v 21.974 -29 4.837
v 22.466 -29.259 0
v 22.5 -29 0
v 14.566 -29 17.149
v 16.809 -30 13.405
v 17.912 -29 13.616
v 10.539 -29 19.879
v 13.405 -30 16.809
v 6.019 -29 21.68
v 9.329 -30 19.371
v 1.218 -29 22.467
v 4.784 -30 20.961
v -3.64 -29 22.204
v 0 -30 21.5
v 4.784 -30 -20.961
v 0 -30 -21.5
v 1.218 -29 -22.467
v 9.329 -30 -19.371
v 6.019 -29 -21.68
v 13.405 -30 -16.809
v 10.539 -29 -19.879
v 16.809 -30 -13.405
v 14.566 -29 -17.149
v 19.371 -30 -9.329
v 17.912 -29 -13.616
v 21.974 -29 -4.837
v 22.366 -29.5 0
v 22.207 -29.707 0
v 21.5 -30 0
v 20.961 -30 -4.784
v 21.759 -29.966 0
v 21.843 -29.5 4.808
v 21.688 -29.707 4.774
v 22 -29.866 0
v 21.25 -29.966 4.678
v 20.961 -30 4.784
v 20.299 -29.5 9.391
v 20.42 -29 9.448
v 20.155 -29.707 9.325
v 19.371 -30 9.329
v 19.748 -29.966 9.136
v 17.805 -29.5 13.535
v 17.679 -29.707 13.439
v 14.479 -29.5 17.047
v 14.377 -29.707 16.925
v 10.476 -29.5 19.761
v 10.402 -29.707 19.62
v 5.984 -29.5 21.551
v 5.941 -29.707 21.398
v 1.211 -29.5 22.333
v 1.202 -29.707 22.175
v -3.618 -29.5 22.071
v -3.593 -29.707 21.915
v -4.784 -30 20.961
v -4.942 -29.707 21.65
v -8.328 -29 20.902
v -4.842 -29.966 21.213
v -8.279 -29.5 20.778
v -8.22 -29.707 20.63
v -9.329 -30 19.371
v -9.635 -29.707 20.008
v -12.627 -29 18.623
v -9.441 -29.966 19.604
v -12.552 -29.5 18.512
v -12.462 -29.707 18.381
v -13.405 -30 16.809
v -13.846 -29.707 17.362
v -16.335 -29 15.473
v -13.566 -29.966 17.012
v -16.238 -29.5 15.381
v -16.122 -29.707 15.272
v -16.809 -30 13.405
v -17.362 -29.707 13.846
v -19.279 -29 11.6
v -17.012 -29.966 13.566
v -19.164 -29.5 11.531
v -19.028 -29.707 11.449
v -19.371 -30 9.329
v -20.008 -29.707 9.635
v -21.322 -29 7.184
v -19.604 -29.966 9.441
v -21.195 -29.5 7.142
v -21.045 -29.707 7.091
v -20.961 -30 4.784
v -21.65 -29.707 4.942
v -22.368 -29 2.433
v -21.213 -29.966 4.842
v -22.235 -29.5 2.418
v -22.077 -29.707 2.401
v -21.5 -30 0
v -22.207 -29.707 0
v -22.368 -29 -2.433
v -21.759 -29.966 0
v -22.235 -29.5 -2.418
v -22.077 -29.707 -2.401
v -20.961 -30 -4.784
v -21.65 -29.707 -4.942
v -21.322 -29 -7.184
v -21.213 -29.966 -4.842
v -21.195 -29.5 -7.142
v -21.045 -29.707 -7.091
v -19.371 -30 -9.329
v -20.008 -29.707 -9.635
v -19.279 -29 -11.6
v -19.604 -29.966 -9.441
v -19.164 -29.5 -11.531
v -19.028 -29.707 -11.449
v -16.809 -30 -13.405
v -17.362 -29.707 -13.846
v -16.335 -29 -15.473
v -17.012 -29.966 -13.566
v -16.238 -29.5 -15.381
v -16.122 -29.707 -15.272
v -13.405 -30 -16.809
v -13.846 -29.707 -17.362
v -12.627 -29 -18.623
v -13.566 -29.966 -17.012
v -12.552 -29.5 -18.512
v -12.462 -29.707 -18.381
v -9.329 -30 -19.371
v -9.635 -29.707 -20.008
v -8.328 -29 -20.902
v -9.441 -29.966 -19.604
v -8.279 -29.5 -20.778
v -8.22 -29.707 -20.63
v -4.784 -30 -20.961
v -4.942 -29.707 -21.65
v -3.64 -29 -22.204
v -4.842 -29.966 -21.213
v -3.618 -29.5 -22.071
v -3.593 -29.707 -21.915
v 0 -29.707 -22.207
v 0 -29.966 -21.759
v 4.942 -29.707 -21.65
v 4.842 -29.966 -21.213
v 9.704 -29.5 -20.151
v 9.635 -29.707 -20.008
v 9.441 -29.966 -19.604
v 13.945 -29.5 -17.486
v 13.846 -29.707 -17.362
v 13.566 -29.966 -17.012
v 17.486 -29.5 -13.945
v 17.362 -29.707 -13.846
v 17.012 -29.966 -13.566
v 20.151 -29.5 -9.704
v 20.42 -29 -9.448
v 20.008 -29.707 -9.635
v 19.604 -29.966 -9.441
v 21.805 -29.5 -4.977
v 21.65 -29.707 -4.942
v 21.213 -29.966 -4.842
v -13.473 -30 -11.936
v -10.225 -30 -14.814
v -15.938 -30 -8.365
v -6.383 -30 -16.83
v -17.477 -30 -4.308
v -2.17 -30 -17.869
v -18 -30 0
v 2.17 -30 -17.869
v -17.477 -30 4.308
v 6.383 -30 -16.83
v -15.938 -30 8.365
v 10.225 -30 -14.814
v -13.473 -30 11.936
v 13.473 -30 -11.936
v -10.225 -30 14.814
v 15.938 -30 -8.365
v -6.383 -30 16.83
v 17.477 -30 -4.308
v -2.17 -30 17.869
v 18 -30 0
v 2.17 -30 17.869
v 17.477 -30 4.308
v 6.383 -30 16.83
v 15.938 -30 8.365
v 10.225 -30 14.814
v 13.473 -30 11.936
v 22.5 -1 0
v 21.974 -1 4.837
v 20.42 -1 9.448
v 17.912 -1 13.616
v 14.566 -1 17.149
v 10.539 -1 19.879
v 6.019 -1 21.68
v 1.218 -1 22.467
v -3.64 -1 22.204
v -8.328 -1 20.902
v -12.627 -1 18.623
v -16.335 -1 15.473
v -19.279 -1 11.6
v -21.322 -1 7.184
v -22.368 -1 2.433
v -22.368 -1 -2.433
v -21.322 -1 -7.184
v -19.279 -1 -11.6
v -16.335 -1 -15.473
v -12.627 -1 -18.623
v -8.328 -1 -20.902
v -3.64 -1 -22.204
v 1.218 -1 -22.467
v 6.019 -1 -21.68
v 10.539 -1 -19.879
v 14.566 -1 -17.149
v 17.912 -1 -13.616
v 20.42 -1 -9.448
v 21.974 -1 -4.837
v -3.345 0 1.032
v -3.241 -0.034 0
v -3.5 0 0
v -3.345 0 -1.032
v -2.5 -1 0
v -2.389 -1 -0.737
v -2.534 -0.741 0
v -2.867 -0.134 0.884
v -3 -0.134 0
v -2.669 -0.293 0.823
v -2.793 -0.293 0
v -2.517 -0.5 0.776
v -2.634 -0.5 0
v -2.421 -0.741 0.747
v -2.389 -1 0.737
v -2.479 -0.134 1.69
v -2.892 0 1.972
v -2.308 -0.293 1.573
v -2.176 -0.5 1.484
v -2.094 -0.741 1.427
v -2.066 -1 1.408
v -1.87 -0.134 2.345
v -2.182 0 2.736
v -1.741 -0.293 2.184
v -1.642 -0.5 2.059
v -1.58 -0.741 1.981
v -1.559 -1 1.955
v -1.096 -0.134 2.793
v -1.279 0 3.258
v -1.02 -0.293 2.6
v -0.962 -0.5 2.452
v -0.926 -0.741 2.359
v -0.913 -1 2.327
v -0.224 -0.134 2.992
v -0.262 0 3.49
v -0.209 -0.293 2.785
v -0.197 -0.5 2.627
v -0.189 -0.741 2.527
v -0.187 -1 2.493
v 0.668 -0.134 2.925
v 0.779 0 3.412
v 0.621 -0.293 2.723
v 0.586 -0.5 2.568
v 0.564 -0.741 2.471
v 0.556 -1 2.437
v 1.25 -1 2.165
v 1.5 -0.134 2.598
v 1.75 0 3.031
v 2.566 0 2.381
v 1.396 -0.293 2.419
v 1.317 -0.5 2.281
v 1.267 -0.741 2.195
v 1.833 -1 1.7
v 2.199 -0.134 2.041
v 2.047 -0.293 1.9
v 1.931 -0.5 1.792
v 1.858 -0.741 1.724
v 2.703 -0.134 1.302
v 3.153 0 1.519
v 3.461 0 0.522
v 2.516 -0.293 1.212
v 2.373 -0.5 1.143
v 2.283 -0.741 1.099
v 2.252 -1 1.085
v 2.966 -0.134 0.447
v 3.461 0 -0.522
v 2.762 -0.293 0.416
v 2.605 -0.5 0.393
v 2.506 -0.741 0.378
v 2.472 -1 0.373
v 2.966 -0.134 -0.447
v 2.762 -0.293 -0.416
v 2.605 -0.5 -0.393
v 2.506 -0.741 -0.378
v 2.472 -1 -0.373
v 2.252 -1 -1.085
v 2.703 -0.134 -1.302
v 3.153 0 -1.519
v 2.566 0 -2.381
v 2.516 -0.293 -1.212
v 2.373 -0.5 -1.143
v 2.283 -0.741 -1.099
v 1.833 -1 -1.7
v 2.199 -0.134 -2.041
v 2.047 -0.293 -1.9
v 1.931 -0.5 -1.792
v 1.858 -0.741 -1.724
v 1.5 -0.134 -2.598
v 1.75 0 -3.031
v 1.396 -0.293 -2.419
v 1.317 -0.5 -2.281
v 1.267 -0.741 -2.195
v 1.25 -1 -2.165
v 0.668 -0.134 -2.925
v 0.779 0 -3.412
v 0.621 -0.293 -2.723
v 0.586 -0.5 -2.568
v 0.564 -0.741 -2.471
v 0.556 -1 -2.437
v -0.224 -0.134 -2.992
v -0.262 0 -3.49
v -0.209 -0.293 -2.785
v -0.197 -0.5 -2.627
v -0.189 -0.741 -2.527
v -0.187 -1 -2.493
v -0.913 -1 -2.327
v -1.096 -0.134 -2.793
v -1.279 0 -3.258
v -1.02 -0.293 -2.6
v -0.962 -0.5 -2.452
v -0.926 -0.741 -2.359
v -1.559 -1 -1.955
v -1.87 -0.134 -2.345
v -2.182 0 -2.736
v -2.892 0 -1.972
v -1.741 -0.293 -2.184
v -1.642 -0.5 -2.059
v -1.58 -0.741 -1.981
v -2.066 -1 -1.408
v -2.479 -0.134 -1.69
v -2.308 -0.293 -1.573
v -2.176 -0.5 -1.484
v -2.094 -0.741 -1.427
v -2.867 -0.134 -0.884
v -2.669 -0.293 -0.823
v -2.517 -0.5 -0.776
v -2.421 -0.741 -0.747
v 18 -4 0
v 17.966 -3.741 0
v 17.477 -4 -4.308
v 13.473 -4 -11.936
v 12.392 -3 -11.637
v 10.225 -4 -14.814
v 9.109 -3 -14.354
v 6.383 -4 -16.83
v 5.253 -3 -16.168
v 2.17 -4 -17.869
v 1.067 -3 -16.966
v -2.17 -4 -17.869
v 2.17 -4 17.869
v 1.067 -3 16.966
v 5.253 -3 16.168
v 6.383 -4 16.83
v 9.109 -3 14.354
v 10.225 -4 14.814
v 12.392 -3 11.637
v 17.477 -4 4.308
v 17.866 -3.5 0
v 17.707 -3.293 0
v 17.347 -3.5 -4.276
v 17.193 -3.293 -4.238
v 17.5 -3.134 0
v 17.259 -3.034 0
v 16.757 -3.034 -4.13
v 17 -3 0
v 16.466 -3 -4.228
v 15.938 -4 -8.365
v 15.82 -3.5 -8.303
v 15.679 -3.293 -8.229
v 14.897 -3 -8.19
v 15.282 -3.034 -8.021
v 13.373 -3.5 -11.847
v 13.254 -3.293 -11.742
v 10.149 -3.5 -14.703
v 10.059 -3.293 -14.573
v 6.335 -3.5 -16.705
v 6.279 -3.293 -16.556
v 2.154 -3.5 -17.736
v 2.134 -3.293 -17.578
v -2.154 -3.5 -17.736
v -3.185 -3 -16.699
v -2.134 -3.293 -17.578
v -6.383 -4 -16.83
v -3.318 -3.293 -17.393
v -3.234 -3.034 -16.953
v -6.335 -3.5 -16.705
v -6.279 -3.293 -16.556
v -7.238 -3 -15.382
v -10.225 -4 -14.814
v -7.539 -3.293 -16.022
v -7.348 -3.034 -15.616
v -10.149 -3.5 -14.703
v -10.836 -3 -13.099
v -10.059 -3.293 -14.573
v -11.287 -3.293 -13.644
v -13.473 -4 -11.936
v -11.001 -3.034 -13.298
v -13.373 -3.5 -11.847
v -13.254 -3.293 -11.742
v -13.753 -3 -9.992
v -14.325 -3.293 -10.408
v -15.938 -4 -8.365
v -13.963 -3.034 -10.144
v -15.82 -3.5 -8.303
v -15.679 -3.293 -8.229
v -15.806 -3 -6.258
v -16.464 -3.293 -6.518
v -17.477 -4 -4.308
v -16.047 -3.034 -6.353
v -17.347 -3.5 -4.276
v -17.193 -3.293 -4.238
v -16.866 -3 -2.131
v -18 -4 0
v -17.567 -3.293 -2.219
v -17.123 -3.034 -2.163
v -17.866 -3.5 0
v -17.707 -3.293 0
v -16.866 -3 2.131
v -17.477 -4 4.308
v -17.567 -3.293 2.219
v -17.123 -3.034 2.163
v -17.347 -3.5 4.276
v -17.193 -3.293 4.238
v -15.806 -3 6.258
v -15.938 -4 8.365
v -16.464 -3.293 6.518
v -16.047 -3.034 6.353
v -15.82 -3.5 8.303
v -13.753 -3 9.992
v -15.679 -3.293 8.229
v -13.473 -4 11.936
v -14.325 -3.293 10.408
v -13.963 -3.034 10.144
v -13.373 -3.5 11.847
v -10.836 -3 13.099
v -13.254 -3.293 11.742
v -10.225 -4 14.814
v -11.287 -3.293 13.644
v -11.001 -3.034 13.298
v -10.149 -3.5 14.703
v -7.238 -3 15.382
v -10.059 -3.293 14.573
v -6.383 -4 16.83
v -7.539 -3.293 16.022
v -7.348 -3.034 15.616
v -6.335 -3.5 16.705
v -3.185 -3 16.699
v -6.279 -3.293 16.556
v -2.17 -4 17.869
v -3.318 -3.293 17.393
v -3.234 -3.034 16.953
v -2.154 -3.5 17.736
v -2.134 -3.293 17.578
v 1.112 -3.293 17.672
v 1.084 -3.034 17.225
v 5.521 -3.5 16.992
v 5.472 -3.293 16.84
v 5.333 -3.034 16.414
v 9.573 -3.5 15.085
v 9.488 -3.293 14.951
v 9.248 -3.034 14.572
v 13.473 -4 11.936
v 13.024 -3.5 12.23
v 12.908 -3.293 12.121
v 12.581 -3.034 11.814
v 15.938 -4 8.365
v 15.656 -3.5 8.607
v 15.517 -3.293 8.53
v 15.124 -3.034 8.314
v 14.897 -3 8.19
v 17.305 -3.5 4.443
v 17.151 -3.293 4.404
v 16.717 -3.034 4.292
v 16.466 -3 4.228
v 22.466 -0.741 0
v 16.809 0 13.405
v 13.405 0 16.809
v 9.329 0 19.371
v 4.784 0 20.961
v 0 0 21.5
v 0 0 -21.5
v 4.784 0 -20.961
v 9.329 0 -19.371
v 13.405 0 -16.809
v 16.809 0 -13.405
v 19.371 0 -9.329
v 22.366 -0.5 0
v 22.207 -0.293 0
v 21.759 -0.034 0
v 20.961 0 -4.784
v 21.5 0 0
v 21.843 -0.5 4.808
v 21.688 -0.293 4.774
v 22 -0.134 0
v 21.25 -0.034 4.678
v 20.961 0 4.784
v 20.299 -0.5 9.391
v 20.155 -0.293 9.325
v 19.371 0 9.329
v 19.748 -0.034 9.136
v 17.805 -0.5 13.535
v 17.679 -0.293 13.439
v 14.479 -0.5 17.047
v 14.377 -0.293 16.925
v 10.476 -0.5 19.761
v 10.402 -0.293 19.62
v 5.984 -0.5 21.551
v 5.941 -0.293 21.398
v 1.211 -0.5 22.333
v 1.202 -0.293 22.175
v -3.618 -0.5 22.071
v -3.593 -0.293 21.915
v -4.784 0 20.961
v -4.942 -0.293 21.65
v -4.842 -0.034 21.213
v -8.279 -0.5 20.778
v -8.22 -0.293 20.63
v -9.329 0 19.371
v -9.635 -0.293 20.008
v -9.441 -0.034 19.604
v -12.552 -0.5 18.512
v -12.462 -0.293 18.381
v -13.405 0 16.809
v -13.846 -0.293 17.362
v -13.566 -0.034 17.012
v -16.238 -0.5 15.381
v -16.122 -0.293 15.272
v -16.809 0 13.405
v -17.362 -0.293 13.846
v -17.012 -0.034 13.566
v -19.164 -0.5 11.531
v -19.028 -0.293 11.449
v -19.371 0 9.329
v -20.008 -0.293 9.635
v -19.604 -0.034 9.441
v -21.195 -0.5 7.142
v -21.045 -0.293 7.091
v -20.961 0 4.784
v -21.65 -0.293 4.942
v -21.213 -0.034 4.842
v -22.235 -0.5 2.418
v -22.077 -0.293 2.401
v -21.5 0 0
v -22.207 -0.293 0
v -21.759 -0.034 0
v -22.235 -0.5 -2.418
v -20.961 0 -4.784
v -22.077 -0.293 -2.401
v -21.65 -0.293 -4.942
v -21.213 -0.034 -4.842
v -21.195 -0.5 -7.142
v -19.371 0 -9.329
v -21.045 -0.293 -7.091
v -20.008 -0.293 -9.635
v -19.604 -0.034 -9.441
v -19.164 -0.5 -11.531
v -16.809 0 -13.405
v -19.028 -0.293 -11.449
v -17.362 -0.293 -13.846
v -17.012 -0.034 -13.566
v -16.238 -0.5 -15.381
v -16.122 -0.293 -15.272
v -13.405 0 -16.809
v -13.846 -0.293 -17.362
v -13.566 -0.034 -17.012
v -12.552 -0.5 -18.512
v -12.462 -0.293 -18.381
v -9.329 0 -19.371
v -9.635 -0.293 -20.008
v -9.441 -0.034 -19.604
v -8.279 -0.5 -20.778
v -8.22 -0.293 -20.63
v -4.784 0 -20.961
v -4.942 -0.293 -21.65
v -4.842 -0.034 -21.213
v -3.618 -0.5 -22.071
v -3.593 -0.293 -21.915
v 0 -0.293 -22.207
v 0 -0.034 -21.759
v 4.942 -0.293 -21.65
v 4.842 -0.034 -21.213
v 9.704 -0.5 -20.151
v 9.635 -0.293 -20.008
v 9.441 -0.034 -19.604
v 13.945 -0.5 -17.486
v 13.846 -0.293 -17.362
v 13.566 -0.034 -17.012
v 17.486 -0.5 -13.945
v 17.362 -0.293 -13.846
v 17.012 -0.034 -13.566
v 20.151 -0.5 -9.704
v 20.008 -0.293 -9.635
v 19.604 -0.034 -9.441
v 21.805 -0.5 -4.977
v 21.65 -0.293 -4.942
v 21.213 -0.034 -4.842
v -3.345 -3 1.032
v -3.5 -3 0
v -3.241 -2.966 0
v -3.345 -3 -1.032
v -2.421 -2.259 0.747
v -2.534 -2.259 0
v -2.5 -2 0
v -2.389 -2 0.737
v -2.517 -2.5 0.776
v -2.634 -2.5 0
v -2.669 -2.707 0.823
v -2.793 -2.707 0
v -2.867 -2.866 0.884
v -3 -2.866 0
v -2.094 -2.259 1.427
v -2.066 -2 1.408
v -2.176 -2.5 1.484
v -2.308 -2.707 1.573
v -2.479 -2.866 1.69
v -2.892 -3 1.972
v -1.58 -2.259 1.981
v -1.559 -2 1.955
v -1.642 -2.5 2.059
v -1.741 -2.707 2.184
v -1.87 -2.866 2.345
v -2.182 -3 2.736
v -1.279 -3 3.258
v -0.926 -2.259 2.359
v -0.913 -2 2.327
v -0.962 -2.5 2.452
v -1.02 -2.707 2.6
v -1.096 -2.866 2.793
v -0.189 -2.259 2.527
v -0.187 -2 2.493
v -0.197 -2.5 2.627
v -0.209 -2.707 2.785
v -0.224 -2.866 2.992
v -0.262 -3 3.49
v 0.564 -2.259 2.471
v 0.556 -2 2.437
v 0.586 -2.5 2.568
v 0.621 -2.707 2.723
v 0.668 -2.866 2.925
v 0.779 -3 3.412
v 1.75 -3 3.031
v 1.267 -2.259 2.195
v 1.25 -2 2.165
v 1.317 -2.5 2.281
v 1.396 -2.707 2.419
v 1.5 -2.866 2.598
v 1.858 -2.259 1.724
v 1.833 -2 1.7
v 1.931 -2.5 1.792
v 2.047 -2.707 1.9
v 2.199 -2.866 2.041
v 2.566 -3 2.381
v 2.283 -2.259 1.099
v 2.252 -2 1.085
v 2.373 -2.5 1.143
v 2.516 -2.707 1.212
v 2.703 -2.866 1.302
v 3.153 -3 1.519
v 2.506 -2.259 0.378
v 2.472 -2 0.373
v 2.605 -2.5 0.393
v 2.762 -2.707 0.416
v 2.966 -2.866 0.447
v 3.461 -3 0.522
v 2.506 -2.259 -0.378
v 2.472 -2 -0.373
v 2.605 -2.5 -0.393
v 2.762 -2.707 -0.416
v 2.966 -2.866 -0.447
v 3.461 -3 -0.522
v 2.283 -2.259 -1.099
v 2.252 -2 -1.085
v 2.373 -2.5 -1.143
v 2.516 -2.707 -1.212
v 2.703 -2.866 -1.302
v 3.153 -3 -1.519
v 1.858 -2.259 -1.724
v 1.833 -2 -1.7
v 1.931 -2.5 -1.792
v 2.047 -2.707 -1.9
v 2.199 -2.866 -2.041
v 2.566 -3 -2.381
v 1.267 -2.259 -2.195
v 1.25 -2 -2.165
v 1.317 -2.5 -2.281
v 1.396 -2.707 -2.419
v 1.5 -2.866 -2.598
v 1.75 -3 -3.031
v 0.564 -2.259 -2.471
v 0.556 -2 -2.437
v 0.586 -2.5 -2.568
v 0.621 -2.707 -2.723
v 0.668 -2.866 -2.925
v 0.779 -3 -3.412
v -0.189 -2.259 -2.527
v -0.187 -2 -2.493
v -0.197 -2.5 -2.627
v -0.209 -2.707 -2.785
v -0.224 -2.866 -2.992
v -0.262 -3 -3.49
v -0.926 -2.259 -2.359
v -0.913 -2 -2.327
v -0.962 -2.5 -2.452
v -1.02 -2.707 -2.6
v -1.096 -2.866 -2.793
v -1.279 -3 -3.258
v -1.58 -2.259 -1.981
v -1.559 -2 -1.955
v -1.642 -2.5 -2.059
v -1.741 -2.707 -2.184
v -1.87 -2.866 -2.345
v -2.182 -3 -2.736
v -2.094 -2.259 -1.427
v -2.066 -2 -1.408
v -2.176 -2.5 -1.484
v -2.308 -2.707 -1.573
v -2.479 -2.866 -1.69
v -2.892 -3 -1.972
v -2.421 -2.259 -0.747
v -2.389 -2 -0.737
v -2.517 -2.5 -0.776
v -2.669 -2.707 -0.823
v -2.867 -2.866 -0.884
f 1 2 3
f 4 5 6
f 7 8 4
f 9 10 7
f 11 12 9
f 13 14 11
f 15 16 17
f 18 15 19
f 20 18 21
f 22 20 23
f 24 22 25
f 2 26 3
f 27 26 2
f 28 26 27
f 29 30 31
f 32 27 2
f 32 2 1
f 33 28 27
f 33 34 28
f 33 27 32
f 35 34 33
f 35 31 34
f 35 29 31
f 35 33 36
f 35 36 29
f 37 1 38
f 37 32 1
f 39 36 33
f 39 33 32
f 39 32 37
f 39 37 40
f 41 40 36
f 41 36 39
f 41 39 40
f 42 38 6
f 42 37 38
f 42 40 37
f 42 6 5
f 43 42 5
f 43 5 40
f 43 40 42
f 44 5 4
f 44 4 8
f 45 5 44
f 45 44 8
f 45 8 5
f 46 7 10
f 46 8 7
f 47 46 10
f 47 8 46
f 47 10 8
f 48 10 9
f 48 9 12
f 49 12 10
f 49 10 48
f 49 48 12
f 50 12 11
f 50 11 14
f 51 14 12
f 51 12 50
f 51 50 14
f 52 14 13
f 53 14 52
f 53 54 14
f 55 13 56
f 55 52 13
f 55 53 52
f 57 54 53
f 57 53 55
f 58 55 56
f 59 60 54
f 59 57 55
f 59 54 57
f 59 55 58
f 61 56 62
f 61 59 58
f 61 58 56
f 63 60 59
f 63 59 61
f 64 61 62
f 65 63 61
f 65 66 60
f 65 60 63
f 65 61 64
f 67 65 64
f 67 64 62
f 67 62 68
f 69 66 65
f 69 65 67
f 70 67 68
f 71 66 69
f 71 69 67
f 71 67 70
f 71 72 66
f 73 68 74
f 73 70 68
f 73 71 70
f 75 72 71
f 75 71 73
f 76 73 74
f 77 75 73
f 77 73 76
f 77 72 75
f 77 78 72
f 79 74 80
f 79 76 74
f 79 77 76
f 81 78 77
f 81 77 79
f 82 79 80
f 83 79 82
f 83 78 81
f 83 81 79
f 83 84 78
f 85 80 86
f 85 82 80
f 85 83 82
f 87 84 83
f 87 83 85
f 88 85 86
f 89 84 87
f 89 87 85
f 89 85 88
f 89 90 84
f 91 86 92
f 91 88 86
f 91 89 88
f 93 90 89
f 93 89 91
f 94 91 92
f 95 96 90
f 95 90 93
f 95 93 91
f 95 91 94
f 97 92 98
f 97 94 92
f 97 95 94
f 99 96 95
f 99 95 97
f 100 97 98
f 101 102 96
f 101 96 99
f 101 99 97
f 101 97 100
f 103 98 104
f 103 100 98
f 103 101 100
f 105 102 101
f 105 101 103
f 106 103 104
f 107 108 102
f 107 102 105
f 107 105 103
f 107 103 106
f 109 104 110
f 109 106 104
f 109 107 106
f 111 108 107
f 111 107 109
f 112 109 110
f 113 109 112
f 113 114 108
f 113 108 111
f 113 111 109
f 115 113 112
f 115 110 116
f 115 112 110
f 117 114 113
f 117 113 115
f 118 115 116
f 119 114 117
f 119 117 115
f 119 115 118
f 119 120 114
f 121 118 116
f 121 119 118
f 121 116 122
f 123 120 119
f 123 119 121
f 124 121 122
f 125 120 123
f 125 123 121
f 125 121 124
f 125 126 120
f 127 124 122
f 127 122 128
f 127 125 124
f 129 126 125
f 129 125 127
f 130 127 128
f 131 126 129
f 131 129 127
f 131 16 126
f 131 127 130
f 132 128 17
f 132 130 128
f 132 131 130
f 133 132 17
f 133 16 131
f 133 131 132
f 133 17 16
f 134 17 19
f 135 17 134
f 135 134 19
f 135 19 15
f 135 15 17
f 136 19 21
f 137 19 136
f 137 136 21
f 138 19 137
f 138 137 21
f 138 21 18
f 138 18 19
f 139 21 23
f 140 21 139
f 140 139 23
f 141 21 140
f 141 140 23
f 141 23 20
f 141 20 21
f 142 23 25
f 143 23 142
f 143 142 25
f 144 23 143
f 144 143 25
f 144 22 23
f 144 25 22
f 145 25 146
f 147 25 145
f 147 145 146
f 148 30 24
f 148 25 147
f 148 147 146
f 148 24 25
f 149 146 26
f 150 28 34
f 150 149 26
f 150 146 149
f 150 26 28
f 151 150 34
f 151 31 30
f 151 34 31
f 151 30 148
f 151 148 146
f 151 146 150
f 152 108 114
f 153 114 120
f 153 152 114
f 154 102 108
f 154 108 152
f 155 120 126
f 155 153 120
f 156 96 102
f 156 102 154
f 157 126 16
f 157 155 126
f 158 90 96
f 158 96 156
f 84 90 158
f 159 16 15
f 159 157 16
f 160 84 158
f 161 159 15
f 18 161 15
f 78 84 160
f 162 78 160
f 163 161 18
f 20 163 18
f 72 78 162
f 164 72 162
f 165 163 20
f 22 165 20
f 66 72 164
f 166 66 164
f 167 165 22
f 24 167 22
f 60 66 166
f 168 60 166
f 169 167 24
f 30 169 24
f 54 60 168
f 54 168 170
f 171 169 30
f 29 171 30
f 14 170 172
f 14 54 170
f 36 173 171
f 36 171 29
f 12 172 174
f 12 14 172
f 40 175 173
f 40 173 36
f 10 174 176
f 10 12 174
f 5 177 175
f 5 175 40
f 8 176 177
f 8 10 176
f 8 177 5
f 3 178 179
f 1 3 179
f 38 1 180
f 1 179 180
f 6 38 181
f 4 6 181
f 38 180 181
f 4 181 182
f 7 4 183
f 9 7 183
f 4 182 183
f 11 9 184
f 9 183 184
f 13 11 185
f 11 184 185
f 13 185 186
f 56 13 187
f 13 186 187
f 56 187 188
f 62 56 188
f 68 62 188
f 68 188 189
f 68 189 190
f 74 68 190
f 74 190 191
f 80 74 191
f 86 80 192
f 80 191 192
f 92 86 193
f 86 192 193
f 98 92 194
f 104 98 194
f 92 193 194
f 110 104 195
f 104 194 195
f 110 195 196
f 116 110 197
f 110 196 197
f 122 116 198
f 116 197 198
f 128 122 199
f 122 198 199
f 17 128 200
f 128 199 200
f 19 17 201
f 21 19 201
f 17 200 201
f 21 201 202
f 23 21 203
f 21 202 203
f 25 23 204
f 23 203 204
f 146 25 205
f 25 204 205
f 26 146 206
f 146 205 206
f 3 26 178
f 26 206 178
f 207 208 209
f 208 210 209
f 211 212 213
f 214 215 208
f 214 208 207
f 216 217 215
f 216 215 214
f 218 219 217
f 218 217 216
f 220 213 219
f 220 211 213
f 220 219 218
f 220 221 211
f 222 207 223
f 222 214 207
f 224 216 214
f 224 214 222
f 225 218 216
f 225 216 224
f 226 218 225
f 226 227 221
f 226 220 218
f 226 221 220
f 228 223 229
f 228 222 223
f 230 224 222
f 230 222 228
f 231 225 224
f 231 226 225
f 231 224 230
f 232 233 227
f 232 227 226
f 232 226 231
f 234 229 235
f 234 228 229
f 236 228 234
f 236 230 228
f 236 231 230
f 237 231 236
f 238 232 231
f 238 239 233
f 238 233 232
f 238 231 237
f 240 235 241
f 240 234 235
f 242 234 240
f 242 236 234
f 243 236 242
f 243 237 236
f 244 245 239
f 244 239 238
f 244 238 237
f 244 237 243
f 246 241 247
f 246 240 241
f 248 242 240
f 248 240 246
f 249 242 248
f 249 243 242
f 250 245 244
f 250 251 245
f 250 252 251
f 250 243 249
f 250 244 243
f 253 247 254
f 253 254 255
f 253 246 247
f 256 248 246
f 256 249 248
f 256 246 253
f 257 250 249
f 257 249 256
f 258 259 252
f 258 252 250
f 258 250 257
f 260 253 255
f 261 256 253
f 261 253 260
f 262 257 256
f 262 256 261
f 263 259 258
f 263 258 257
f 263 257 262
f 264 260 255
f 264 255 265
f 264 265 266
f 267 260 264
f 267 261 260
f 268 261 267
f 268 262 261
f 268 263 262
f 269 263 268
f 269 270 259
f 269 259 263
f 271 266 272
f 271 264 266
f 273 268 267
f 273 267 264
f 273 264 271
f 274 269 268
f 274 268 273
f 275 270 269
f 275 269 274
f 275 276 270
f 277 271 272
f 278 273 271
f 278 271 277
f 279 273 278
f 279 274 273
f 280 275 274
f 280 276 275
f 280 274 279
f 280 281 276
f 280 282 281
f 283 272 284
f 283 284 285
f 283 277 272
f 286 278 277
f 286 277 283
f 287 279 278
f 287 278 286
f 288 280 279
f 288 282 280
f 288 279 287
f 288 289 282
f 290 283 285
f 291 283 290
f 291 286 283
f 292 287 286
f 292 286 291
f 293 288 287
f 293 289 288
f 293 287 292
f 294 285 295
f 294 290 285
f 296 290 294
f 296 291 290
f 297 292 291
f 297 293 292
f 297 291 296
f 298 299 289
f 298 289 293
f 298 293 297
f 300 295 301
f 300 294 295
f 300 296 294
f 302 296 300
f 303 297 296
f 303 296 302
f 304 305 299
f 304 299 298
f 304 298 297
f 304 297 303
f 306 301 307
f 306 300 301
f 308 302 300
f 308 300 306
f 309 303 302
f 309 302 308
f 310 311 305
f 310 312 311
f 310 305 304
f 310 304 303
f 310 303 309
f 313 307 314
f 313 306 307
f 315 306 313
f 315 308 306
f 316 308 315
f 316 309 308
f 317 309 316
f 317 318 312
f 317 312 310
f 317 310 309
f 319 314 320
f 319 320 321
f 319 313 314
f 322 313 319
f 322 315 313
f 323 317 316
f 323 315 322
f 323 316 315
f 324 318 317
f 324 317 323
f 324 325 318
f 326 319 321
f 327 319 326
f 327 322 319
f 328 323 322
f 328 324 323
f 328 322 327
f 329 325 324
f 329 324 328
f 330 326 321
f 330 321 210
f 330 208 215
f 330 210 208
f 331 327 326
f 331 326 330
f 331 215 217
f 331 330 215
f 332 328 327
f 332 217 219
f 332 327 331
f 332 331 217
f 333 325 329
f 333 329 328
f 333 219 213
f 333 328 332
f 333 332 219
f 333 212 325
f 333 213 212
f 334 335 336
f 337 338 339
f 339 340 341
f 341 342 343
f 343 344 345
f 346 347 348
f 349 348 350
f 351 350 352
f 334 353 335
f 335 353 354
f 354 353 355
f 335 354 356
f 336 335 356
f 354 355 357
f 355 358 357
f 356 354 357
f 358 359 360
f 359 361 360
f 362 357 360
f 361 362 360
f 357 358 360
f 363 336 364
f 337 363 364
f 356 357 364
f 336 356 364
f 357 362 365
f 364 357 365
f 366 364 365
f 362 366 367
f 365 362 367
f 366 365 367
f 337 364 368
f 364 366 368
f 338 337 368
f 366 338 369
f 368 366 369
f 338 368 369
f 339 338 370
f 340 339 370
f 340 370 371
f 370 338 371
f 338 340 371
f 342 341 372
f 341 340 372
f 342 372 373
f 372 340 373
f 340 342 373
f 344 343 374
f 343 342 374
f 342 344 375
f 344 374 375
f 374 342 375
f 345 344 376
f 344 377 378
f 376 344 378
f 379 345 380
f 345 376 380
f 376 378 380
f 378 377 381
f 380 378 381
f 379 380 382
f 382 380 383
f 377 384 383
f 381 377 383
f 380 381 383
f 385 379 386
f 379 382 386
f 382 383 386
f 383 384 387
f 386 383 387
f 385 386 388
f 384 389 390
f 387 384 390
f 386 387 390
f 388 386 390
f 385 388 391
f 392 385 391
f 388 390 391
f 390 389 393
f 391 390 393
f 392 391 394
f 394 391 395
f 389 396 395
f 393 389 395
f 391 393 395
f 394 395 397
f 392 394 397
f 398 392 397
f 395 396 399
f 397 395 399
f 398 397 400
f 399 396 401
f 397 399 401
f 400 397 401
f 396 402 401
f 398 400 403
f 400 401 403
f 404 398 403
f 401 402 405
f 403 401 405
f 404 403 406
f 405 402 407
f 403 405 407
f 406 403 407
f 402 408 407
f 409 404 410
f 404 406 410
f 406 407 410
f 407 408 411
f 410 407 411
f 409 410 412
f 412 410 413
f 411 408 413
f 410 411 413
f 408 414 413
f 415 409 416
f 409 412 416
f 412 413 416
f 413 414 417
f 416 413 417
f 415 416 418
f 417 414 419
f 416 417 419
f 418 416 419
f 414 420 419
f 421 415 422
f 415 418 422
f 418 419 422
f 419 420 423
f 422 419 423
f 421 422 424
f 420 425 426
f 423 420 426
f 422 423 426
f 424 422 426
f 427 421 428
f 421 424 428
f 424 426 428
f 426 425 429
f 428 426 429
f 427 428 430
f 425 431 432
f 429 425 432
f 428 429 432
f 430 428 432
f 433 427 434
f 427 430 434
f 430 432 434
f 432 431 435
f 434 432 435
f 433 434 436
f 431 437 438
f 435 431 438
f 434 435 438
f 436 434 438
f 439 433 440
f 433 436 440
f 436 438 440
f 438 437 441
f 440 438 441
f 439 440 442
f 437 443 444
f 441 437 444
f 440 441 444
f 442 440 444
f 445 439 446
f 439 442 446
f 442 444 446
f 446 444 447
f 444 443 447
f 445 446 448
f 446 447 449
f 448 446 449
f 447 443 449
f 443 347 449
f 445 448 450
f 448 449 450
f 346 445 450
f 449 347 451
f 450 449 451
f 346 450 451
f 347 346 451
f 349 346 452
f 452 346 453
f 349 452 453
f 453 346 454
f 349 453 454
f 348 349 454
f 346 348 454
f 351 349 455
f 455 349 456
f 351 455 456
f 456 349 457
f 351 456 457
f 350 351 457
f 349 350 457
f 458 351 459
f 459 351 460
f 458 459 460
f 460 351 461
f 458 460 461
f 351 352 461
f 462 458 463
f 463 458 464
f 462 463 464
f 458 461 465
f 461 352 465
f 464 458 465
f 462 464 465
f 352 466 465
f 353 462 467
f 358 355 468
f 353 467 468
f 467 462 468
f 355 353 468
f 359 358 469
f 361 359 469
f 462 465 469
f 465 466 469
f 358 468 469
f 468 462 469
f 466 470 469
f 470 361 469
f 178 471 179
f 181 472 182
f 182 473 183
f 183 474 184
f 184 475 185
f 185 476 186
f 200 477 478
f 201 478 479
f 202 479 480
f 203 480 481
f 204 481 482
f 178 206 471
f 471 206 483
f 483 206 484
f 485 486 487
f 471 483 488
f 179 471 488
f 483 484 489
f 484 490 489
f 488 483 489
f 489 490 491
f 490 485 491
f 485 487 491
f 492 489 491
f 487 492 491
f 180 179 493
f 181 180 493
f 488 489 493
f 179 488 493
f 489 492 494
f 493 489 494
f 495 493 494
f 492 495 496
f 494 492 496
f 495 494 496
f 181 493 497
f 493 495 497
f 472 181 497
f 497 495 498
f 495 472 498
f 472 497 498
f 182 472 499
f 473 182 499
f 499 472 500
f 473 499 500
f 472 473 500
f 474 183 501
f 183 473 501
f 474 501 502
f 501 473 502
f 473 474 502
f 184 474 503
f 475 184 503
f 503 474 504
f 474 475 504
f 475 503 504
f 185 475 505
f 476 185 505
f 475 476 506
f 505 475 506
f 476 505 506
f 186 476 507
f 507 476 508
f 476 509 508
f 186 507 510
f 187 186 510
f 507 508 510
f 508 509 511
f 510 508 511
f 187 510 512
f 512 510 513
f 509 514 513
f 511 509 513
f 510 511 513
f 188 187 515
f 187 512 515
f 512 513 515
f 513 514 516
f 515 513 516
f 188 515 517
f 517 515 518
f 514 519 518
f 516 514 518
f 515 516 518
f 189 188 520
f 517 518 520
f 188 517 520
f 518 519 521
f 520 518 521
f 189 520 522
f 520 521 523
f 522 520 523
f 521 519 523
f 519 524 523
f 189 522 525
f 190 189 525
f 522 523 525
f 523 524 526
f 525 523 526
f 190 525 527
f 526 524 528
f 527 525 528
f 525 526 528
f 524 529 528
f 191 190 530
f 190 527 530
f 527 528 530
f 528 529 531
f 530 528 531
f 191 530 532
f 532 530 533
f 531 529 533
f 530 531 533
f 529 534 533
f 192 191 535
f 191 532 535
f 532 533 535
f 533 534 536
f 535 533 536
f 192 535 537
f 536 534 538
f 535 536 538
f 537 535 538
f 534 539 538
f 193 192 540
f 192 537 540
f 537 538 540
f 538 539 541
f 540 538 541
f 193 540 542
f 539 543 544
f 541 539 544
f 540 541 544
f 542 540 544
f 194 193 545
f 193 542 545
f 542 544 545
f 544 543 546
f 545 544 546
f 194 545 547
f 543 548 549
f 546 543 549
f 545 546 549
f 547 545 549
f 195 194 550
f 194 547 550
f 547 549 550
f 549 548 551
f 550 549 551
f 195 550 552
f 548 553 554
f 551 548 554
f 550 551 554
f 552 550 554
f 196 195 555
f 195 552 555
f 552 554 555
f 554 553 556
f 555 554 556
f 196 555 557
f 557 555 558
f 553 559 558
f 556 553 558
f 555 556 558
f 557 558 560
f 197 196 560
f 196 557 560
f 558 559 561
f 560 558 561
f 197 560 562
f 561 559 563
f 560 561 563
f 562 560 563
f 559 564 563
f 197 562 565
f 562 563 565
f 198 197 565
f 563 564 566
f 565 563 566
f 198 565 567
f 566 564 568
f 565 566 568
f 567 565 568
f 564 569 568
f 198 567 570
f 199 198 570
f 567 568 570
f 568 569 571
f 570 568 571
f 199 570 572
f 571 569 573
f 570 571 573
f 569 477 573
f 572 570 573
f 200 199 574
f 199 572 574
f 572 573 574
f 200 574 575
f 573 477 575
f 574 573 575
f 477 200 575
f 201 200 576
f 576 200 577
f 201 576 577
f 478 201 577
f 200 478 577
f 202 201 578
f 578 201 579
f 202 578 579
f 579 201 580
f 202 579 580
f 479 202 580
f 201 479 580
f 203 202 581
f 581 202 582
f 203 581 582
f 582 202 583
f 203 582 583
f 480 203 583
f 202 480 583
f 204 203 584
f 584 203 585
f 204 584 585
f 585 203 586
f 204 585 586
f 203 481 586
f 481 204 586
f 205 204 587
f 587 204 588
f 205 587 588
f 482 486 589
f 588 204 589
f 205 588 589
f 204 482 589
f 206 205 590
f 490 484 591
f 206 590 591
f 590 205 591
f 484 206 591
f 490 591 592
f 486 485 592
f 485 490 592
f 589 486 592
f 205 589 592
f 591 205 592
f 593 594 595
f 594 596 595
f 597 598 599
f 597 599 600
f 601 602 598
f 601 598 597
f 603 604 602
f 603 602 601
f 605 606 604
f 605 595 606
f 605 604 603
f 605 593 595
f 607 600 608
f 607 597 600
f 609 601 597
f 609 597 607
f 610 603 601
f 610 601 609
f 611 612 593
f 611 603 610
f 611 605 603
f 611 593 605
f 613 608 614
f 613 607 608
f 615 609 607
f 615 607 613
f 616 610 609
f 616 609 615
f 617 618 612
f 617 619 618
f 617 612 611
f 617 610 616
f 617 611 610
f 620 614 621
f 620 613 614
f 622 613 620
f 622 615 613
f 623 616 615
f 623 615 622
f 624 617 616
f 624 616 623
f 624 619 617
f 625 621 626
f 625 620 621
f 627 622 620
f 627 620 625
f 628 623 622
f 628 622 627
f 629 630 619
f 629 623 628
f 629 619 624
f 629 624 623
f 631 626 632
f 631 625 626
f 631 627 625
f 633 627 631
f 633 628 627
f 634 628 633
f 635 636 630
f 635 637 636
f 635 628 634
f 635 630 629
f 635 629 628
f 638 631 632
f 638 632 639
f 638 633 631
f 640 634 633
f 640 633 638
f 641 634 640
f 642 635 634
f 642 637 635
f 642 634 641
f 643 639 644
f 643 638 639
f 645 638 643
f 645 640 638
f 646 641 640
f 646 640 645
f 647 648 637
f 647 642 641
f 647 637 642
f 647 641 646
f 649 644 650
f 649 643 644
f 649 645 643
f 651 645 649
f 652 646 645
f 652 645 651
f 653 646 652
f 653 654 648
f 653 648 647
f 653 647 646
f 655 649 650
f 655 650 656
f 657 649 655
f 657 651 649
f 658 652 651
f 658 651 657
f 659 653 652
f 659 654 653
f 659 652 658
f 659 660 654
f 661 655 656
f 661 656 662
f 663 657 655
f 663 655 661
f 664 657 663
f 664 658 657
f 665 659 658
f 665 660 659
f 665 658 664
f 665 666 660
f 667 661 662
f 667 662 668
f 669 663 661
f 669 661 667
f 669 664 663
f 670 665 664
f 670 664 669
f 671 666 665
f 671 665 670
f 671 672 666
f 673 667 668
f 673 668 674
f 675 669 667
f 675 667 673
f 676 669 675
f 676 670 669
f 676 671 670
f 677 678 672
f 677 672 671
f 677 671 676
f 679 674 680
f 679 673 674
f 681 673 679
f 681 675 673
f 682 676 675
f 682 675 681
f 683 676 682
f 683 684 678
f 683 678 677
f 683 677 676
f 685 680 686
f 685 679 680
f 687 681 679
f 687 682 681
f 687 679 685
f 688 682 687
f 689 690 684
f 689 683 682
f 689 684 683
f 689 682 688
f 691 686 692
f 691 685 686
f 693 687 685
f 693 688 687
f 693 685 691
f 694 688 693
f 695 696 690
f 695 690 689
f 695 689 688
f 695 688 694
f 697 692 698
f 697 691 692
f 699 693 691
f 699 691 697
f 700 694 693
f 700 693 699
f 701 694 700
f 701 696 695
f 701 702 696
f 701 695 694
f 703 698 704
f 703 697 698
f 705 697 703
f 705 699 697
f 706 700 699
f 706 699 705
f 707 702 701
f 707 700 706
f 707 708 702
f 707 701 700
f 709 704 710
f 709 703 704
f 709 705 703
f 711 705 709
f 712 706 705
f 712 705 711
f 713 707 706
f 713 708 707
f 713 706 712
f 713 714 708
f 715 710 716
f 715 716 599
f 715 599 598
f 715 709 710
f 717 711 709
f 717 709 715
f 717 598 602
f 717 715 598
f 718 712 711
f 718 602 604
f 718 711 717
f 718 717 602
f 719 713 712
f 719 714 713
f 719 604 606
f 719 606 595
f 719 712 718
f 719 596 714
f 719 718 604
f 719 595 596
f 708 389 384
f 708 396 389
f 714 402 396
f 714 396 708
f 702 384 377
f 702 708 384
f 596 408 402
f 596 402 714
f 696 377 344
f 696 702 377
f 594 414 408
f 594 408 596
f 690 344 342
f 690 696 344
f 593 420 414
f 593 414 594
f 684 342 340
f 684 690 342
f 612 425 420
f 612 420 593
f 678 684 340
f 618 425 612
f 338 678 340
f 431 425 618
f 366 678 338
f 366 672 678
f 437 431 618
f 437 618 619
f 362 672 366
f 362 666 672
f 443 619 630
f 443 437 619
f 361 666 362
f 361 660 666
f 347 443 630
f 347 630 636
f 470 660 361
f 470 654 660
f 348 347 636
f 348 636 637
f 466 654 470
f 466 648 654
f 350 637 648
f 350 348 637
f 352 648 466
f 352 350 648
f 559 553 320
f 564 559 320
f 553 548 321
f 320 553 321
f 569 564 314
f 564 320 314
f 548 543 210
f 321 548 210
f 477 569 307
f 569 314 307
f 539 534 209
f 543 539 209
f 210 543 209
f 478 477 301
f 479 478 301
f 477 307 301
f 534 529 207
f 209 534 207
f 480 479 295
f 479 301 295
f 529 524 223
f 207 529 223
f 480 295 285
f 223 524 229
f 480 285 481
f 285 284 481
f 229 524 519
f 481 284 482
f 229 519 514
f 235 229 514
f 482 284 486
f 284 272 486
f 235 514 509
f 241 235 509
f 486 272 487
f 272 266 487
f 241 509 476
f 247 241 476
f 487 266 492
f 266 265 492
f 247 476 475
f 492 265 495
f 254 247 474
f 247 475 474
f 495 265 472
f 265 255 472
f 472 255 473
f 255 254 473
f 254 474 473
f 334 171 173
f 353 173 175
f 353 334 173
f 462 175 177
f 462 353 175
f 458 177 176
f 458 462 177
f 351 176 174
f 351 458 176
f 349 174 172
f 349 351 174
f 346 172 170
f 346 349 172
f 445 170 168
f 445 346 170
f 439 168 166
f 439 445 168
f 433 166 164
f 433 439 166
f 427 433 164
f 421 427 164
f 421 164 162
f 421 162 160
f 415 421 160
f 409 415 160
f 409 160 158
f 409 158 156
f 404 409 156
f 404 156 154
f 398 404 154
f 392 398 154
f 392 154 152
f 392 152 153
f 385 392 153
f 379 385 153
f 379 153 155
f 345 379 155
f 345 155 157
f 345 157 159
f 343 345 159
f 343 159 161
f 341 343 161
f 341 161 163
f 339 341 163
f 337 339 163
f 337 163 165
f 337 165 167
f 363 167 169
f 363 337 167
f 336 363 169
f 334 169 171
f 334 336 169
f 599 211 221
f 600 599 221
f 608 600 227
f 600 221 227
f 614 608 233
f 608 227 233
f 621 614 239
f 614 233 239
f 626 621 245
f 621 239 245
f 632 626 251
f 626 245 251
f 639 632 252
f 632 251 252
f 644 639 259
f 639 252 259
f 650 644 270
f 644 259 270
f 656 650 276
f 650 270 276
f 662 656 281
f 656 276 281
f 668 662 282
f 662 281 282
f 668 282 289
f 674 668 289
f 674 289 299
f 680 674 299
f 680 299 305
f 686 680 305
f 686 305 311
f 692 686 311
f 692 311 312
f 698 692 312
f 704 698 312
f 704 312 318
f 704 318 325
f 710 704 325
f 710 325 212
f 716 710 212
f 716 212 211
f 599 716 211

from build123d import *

# Parameters (mm, degrees)
F0_R     = 22.5
F0_R_2   = 18
F1_DEPTH = 3
F2_DEPTH = 30
F3_R     = 1
F4_R     = 2.5
F5_DEPTH = 25
F6_R     = 1


with BuildPart() as f1:
    # F0 (on Front) → F1 (new body)
    with BuildSketch(Plane.XZ):
        Circle(F0_R)
        Circle(F0_R_2, mode=Mode.SUBTRACT)
        Circle(F0_R_2)
    extrude(amount=F1_DEPTH)

    # F0 (on Front) → F2 (join)
    with BuildSketch(Plane.XZ):
        Circle(F0_R)
        Circle(F0_R_2, mode=Mode.SUBTRACT)
    extrude(amount=F2_DEPTH)

    # F3
    f3_edges = [f1.edges().sort_by_distance(p)[0] for p in [
        (-18, -3, 0),
        (-22.5, -30, 0),
        (-22.5, 0, 0),
    ]]
    fillet(f3_edges, radius=F3_R)

    # F4 (on face) → F5 (cut)
    with BuildSketch(Plane(origin=(0, 0, 0), x_dir=(-1, 0, 0), z_dir=(0, 1, 0))):
        Circle(F4_R)
    extrude(amount=-F5_DEPTH, mode=Mode.SUBTRACT)

    # F6
    f6_edges = [f1.edges().sort_by_distance(p)[0] for p in [
        (2.5, -3, 0),
        (2.5, 0, 0),
    ]]
    fillet(f6_edges, radius=F6_R)


solid = f1.part
